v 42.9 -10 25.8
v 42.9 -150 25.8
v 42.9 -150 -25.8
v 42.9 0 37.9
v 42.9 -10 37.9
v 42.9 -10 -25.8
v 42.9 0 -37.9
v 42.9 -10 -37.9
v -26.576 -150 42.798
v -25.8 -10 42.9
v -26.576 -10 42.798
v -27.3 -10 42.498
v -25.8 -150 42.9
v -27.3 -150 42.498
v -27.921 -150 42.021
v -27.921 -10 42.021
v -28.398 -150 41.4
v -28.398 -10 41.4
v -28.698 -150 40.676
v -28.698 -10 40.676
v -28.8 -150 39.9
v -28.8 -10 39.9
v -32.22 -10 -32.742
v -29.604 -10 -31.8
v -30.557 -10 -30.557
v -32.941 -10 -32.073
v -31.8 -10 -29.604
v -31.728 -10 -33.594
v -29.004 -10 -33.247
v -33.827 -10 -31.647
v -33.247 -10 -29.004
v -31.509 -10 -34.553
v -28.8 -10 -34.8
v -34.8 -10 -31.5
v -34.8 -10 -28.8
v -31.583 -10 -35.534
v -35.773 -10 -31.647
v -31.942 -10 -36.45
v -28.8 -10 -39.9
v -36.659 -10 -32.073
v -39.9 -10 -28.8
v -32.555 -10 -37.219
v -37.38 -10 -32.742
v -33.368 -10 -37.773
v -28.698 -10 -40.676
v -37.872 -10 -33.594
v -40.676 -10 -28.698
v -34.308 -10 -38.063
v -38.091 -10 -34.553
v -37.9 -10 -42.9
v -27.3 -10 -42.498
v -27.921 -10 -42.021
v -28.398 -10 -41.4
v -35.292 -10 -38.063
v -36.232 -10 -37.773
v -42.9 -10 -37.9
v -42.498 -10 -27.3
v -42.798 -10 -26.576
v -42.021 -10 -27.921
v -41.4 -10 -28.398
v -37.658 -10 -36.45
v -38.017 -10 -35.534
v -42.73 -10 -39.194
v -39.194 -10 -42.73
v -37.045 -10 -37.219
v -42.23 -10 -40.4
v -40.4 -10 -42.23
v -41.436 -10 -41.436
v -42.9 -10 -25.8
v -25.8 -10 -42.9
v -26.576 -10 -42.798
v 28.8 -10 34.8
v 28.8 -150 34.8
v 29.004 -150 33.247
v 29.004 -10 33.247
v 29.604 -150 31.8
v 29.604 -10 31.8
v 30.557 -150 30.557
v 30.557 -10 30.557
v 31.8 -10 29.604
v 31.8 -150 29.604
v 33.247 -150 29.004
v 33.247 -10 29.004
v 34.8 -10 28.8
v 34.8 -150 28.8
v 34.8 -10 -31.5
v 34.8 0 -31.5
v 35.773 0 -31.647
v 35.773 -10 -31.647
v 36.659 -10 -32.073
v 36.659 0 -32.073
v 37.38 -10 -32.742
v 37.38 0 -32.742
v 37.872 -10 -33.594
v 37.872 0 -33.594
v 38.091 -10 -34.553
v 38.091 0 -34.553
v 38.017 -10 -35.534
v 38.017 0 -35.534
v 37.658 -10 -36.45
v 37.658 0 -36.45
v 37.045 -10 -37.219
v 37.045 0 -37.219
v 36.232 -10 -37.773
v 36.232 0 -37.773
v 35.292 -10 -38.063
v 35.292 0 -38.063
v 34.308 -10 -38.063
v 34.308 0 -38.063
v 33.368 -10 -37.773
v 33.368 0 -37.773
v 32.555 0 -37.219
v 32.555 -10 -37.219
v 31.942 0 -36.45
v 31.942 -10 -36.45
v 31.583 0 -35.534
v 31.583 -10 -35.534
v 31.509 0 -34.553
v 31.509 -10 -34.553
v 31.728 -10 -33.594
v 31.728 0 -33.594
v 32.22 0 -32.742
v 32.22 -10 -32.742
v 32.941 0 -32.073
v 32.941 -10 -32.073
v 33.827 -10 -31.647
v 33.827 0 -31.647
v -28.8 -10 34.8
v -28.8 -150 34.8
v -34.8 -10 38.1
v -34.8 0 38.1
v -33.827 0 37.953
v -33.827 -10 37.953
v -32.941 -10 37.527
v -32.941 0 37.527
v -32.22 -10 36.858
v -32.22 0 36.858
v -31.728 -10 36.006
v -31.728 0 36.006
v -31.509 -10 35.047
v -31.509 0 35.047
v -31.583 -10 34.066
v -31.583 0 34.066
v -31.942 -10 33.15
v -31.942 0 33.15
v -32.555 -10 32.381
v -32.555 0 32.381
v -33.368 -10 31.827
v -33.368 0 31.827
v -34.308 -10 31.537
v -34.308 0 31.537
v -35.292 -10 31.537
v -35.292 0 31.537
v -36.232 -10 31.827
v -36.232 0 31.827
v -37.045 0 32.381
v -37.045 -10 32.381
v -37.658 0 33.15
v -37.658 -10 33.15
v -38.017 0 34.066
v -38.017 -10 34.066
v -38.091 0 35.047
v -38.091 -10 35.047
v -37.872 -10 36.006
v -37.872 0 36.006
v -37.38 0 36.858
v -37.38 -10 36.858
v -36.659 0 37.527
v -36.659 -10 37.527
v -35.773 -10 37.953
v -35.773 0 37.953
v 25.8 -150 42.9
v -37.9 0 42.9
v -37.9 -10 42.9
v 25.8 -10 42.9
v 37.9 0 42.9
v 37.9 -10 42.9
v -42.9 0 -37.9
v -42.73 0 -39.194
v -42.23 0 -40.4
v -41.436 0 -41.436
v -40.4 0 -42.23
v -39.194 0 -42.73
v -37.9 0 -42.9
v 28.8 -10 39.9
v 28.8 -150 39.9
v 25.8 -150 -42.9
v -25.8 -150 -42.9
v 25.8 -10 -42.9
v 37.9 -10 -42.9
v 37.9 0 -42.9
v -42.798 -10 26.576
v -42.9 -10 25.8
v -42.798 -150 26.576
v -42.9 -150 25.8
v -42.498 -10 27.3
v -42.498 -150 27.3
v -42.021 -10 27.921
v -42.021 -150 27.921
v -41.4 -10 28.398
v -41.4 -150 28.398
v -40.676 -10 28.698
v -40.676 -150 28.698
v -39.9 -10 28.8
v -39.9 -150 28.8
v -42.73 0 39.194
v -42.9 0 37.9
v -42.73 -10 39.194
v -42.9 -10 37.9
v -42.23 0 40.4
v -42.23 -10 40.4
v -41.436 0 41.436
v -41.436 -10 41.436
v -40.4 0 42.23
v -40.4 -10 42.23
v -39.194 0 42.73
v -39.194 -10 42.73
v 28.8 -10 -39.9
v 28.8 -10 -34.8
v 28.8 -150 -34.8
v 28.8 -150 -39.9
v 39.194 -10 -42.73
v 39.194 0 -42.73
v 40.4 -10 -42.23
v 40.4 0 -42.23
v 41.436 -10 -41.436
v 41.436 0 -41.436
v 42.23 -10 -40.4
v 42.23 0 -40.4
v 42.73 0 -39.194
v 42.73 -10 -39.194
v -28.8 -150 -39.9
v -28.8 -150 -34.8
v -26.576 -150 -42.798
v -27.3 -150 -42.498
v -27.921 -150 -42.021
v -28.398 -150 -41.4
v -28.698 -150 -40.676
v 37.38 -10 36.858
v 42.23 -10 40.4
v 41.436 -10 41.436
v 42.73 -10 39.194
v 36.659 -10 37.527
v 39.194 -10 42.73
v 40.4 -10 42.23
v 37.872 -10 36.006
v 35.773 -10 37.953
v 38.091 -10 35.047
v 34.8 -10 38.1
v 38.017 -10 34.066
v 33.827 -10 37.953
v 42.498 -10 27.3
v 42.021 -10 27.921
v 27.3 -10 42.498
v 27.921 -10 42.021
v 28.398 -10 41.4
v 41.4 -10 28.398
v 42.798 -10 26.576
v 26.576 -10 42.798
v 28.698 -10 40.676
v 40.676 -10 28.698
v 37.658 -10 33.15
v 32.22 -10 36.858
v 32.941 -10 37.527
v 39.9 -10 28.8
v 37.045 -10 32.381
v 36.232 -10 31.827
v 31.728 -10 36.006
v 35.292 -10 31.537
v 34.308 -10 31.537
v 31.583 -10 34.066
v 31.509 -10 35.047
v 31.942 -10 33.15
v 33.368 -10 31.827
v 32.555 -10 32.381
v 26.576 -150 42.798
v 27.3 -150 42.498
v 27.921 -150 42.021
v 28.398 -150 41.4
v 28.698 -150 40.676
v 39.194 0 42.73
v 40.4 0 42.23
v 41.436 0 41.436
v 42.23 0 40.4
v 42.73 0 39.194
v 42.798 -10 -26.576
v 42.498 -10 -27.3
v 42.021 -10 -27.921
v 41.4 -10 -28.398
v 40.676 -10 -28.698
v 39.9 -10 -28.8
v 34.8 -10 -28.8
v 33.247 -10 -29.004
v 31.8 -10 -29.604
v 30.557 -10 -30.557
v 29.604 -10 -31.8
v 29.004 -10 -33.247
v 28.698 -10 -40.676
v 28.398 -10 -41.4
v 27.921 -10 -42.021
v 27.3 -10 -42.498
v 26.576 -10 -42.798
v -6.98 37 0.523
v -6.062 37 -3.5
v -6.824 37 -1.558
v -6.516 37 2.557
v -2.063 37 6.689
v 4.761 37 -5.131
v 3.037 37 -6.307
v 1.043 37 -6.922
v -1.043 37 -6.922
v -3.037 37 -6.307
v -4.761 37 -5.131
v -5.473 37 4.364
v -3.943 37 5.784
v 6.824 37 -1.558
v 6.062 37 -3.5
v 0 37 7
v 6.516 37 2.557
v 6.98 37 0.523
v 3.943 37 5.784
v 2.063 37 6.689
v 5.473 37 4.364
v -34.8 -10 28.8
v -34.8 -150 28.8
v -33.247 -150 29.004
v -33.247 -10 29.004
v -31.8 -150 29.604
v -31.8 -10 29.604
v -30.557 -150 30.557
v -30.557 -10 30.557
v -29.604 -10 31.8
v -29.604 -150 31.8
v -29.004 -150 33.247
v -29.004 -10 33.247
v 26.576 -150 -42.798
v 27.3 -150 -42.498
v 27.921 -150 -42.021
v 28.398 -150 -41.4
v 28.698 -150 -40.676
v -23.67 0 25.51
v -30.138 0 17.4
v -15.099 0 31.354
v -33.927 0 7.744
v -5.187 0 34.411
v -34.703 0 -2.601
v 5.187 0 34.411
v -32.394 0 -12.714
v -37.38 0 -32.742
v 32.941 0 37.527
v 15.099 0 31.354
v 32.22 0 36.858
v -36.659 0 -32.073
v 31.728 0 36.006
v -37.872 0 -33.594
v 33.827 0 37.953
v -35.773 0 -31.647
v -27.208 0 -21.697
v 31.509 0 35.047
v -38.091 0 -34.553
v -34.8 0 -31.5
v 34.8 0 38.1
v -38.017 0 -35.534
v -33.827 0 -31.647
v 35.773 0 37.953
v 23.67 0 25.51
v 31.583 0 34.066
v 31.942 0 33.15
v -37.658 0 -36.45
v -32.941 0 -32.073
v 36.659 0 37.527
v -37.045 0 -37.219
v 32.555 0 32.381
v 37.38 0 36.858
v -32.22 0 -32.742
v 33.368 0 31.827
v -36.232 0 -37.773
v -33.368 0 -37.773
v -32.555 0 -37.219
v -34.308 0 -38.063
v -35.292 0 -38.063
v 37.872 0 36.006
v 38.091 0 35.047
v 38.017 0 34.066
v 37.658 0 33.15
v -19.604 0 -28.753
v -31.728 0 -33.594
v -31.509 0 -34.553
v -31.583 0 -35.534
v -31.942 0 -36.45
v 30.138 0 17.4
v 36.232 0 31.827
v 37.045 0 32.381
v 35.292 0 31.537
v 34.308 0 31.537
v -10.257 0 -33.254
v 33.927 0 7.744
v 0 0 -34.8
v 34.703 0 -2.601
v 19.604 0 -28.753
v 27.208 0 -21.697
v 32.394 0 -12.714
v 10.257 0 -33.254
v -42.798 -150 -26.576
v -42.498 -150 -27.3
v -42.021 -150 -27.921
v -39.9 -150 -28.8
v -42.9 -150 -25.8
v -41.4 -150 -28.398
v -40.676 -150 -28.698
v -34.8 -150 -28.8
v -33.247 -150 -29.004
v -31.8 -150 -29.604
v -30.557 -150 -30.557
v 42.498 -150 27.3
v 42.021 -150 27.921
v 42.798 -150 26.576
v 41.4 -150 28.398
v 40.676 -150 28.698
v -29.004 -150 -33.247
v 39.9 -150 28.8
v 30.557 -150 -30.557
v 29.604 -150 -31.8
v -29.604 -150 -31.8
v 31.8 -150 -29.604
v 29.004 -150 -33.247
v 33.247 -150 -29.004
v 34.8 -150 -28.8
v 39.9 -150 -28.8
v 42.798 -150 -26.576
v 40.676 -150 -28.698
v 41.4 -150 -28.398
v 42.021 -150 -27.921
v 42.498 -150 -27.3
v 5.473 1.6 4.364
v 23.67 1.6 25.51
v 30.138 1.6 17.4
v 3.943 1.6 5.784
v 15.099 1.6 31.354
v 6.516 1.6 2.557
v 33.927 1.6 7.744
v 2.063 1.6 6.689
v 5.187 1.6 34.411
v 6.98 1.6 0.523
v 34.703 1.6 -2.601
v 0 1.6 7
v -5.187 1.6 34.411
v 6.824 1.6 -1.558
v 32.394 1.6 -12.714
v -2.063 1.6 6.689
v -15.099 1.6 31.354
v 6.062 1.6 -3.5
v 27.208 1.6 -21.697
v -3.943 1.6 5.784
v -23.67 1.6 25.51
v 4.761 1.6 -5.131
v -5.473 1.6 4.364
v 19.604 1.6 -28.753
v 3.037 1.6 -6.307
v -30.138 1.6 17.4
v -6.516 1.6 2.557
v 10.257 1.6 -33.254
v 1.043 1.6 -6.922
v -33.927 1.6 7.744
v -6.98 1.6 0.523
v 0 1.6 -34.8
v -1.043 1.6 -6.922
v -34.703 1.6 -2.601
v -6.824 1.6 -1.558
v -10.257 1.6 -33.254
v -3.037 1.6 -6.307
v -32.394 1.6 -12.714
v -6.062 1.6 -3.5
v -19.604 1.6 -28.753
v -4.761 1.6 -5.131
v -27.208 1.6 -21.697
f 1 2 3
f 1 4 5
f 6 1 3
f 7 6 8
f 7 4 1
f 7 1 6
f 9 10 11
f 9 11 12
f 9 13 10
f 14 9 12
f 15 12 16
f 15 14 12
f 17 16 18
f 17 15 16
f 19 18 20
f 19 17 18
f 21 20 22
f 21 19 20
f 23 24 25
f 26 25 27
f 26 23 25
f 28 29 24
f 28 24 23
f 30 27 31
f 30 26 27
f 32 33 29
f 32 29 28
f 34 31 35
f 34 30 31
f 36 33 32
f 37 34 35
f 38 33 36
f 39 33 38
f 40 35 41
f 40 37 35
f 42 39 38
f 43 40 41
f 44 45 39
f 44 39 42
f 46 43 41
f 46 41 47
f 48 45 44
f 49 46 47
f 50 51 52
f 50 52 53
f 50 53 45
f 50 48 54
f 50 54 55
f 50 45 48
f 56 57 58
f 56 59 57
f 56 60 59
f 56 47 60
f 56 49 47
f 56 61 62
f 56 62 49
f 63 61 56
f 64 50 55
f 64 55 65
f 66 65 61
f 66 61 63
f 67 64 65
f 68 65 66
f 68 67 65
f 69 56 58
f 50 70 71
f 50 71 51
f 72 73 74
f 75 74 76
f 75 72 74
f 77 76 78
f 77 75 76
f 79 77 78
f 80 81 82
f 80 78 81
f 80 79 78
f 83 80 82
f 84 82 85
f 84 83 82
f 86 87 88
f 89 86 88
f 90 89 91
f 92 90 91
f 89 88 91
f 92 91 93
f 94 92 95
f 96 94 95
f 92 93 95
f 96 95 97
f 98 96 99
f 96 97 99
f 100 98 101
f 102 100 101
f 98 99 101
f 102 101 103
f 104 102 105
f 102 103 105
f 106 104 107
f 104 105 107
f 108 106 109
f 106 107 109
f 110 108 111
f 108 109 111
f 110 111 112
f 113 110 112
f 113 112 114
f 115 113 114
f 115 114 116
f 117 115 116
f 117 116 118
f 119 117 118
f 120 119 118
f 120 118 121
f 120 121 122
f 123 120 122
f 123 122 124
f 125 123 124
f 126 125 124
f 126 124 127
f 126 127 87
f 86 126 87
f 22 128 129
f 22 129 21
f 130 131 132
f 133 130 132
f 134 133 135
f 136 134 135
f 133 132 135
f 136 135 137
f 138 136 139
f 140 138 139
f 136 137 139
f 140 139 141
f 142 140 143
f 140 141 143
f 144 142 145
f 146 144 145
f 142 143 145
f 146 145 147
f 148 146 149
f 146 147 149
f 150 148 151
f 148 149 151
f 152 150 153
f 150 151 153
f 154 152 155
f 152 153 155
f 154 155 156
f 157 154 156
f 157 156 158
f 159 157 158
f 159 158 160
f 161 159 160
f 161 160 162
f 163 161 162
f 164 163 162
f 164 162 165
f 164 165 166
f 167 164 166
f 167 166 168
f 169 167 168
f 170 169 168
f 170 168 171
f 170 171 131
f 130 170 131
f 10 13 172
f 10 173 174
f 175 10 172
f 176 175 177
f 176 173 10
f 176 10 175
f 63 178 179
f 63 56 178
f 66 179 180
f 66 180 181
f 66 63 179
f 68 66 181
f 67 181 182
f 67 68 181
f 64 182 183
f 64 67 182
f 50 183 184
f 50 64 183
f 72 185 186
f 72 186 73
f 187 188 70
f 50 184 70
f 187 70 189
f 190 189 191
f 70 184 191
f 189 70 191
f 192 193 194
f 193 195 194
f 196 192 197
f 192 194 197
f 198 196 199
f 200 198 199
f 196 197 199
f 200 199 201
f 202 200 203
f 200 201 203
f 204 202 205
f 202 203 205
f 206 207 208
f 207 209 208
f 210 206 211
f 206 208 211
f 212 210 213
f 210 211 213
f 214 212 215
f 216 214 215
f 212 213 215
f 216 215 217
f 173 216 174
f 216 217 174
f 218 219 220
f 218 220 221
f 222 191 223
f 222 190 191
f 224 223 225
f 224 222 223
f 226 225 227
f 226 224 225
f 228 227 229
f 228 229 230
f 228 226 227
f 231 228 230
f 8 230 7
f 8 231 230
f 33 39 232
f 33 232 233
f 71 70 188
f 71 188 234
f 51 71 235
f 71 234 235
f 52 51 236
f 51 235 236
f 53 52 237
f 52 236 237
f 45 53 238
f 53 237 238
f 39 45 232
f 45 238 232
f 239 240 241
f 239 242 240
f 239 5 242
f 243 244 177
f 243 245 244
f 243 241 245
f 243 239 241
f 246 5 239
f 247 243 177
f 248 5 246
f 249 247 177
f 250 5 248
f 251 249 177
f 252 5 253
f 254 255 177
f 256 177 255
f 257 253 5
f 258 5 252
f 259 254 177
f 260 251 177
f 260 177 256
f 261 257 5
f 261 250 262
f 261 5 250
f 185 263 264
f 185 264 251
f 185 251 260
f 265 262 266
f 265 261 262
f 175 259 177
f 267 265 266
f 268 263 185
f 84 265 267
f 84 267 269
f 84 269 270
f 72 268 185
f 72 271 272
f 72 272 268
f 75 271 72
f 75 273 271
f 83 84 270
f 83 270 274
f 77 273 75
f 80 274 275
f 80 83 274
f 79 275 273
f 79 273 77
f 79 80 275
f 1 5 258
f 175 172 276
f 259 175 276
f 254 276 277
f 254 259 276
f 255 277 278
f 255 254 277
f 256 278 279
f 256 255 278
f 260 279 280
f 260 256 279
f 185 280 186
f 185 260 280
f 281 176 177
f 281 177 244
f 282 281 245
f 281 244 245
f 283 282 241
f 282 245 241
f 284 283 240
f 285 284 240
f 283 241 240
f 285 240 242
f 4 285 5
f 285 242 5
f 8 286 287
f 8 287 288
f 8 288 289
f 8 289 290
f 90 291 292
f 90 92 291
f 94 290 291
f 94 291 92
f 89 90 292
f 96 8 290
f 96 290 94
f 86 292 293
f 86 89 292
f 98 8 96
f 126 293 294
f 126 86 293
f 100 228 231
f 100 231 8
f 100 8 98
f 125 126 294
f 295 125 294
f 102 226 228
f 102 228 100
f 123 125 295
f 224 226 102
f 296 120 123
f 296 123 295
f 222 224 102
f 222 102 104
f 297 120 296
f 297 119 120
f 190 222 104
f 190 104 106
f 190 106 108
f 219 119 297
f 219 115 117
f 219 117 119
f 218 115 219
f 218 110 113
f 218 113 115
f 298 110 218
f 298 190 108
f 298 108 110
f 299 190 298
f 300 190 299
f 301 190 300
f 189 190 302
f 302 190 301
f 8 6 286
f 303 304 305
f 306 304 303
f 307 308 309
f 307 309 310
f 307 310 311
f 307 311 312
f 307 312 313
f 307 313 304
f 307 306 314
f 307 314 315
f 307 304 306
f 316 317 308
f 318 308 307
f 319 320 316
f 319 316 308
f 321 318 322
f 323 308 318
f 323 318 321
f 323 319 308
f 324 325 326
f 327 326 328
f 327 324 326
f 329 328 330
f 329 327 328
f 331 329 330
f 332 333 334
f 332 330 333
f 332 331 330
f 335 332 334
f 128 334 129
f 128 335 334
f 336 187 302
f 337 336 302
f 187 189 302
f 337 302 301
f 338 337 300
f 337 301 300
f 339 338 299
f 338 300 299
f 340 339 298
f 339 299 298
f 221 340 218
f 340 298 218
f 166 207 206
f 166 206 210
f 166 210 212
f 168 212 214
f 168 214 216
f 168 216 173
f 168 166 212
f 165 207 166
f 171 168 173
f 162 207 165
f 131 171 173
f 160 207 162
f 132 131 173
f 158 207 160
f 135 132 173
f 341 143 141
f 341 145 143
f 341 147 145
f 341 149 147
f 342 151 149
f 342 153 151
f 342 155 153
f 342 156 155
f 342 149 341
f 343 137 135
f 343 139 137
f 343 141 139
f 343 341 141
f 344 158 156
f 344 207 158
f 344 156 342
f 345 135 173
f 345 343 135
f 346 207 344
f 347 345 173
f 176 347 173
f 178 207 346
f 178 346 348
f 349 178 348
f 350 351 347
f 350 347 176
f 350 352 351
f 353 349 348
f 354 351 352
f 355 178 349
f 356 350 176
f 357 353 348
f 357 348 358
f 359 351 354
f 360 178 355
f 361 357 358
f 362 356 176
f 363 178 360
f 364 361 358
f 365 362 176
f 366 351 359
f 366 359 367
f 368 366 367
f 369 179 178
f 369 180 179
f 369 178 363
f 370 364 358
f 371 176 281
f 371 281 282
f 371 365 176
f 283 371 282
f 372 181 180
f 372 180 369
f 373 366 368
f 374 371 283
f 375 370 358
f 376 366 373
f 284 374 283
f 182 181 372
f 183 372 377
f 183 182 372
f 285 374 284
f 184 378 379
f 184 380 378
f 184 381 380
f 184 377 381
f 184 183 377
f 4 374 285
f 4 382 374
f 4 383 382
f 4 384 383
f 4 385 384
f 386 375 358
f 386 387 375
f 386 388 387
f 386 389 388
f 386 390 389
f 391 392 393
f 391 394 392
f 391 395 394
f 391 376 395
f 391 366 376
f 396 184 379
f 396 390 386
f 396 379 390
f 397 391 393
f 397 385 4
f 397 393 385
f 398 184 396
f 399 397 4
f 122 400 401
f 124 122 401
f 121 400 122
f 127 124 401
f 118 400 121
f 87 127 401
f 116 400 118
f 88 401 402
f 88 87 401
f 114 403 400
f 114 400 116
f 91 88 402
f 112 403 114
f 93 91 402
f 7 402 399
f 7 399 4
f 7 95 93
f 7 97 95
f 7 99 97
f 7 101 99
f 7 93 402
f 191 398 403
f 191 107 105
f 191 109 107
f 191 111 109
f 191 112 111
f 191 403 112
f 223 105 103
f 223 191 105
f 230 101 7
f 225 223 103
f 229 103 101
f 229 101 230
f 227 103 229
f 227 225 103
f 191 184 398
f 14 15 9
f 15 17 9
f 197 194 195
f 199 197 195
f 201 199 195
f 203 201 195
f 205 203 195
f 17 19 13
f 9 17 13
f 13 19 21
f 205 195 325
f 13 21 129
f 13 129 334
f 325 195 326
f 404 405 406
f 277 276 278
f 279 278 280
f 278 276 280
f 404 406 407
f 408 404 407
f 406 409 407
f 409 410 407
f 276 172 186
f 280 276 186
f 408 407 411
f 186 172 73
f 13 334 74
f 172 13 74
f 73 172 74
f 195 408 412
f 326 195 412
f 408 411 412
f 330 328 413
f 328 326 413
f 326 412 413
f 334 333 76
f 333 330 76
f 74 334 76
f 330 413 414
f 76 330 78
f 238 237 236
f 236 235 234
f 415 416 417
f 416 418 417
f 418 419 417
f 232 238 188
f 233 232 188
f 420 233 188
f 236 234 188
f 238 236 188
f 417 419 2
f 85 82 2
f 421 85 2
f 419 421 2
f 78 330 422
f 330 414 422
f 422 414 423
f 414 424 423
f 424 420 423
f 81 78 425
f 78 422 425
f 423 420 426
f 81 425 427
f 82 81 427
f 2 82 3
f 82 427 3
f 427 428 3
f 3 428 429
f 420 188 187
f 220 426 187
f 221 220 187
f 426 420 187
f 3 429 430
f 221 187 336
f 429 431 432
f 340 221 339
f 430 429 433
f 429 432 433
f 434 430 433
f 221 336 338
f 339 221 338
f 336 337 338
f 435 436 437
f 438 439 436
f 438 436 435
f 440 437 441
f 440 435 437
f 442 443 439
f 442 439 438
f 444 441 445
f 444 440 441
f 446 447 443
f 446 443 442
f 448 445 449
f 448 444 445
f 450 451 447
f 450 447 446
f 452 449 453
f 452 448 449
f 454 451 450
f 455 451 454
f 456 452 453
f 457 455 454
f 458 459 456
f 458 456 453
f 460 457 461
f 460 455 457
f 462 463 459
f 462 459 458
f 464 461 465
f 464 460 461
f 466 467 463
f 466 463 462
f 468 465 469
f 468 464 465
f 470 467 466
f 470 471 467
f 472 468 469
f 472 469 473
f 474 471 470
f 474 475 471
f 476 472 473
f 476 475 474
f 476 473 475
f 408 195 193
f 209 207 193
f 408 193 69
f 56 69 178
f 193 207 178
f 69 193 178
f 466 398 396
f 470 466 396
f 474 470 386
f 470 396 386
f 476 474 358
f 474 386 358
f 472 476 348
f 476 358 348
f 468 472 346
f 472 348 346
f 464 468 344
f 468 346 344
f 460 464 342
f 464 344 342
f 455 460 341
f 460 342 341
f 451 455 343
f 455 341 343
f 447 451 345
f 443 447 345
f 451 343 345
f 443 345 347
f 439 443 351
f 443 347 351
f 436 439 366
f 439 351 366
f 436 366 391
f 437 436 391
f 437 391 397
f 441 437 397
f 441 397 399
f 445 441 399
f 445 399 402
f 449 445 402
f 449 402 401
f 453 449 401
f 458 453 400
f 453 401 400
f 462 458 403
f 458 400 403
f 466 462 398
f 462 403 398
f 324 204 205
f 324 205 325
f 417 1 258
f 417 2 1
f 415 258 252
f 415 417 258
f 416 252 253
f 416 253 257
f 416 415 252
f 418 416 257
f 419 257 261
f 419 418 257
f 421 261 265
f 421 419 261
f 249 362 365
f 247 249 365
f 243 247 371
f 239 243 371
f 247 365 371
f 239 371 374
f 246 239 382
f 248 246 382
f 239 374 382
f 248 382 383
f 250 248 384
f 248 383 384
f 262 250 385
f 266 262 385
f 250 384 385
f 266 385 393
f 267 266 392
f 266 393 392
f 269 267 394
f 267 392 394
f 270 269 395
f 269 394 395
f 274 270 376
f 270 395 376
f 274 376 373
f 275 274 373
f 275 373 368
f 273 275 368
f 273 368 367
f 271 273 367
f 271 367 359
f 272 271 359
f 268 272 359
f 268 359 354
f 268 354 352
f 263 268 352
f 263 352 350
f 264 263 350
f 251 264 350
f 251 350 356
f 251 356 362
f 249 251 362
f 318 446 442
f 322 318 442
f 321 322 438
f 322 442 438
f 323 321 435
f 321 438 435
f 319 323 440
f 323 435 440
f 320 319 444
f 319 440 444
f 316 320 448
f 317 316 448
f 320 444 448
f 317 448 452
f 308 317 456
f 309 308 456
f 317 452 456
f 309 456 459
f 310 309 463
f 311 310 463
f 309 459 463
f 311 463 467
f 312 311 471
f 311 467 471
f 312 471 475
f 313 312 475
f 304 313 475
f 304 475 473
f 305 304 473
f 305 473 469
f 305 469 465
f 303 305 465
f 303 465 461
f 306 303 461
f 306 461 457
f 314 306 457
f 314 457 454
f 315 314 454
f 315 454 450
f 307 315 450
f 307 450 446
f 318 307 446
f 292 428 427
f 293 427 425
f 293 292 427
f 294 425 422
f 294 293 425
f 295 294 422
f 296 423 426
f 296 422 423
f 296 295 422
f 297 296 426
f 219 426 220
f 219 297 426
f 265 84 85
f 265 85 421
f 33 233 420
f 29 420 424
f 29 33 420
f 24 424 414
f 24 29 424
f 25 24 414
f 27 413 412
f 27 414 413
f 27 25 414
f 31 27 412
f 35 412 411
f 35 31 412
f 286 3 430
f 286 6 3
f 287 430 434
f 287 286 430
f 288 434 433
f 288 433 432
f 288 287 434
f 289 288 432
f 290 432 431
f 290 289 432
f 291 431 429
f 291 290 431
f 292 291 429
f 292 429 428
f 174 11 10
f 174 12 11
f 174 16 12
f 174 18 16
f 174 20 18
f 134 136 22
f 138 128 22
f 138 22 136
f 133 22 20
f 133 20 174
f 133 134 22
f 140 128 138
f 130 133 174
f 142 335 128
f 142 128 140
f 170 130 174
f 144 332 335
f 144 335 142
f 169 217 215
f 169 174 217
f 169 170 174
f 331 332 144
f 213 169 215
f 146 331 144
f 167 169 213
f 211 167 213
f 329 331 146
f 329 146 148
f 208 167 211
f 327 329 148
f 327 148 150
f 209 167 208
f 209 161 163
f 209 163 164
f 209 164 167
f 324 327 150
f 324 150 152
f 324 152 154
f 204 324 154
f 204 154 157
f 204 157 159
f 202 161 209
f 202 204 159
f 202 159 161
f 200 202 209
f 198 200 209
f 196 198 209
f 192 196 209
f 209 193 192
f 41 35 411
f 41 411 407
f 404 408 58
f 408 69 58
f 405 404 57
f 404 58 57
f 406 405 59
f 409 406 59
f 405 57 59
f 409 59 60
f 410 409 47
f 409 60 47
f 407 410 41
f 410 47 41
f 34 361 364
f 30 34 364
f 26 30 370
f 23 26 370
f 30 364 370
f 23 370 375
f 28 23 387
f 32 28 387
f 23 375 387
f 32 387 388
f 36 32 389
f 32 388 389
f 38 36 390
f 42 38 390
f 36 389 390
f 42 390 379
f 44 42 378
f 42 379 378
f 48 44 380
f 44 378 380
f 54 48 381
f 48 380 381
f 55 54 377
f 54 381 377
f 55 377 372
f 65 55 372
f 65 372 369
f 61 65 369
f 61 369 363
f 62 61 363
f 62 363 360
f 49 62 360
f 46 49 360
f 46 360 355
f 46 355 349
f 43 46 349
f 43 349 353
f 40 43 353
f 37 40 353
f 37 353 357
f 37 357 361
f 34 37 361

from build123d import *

# Parameters (mm, degrees)
SKETCH1_W           = 85.8
SKETCH1_H           = 85.8
SKETCH1_R           = 3.3
BOSS_EXTRUDE1_DEPTH = 150
SKETCH2_R           = 34.8
BOSS_EXTRUDE2_DEPTH = 1.6
SKETCH3_R           = 7
BOSS_EXTRUDE3_DEPTH = 37
CUT_EXTRUDE1_START  = -10
CUT_EXTRUDE1_DEPTH  = 157
FILLET1_R           = 5
FILLET2_R           = 3


with BuildPart() as part:
    # Sketch1 → Boss-Extrude1 (new body)
    with BuildSketch(Plane(origin=(0, 0, 0), x_dir=(1, 0, 0), z_dir=(0, 1, 0))):
        Rectangle(SKETCH1_W, SKETCH1_H)
        with Locations(Location((-34.8, 34.8, 0), (0, 0, 270))):
            Circle(SKETCH1_R, mode=Mode.SUBTRACT)
        with Locations(Location((34.8, 34.8, 0), (0, 0, 270))):
            Circle(SKETCH1_R, mode=Mode.SUBTRACT)
        with Locations(Location((34.8, -34.8, 0), (0, 0, 270))):
            Circle(SKETCH1_R, mode=Mode.SUBTRACT)
        with Locations(Location((-34.8, -34.8, 0), (0, 0, 270))):
            Circle(SKETCH1_R, mode=Mode.SUBTRACT)
    extrude(amount=-BOSS_EXTRUDE1_DEPTH)

    # Sketch2 → Boss-Extrude2 (add)
    with BuildSketch(Plane(origin=(0, 0, 0), x_dir=(1, 0, 0), z_dir=(0, 1, 0))):
        with Locations(Location((0, 0, 0), (0, 0, 90))):
            Circle(SKETCH2_R)
    extrude(amount=BOSS_EXTRUDE2_DEPTH)

    # Sketch3 → Boss-Extrude3 (add)
    with BuildSketch(Plane(origin=(0, 0, 0), x_dir=(1, 0, 0), z_dir=(0, 1, 0))):
        with Locations(Location((0, 0, 0), (0, 0, 270))):
            Circle(SKETCH3_R)
    extrude(amount=BOSS_EXTRUDE3_DEPTH)

    # Sketch4 → Cut-Extrude1 (cut)
    with BuildSketch(Plane(origin=(0, 0, 0), x_dir=(1, 0, 0), z_dir=(0, 1, 0)).offset(CUT_EXTRUDE1_START)):
        with BuildLine():
            Line((-34.8, 28.8), (-51.295140444, 28.8))
            Line((-51.295140444, 28.8), (-51.295140444, 48.66224904))
            Line((-51.295140444, 48.66224904), (-28.8, 48.66224904))
            Line((-28.8, 48.66224904), (-28.8, 34.8))
            ThreePointArc((-28.8, 34.8), (-30.557359313, 30.557359313), (-34.8, 28.8))
        make_face()
        with BuildLine():
            Line((48.66224904, 28.8), (34.8, 28.8))
            ThreePointArc((34.8, 28.8), (30.557359313, 30.557359313), (28.8, 34.8))
            Line((28.8, 34.8), (28.8, 51.295140444))
            Line((28.8, 51.295140444), (48.66224904, 51.295140444))
            Line((48.66224904, 51.295140444), (48.66224904, 28.8))
        make_face()
        with BuildLine():
            Line((28.8, -48.66224904), (28.8, -34.8))
            ThreePointArc((28.8, -34.8), (30.557359313, -30.557359313), (34.8, -28.8))
            Line((34.8, -28.8), (51.295140444, -28.8))
            Line((51.295140444, -28.8), (51.295140444, -48.66224904))
            Line((51.295140444, -48.66224904), (28.8, -48.66224904))
        make_face()
        with BuildLine():
            Line((-48.66224904, -28.8), (-34.8, -28.8))
            ThreePointArc((-34.8, -28.8), (-30.557359313, -30.557359313), (-28.8, -34.8))
            Line((-28.8, -34.8), (-28.8, -51.295140444))
            Line((-28.8, -51.295140444), (-48.66224904, -51.295140444))
            Line((-48.66224904, -51.295140444), (-48.66224904, -28.8))
        make_face()
    extrude(amount=-CUT_EXTRUDE1_DEPTH, mode=Mode.SUBTRACT)

    # Fillet1
    fillet1_edges = [part.edges().sort_by_distance(p)[0] for p in [
        (42.9, -5, -42.9),
        (-42.9, -5, -42.9),
        (-42.9, -5, 42.9),
        (42.9, -5, 42.9),
    ]]
    fillet(fillet1_edges, radius=FILLET1_R)

    # Fillet2
    fillet2_edges = [part.edges().sort_by_distance(p)[0] for p in [
        (-28.8, -80, 42.9),
        (-42.9, -80, 28.8),
        (42.9, -80, 28.8),
        (28.8, -80, 42.9),
        (28.8, -80, -42.9),
        (42.9, -80, -28.8),
        (-42.9, -80, -28.8),
        (-28.8, -80, -42.9),
    ]]
    fillet(fillet2_edges, radius=FILLET2_R)


solid = part.part
